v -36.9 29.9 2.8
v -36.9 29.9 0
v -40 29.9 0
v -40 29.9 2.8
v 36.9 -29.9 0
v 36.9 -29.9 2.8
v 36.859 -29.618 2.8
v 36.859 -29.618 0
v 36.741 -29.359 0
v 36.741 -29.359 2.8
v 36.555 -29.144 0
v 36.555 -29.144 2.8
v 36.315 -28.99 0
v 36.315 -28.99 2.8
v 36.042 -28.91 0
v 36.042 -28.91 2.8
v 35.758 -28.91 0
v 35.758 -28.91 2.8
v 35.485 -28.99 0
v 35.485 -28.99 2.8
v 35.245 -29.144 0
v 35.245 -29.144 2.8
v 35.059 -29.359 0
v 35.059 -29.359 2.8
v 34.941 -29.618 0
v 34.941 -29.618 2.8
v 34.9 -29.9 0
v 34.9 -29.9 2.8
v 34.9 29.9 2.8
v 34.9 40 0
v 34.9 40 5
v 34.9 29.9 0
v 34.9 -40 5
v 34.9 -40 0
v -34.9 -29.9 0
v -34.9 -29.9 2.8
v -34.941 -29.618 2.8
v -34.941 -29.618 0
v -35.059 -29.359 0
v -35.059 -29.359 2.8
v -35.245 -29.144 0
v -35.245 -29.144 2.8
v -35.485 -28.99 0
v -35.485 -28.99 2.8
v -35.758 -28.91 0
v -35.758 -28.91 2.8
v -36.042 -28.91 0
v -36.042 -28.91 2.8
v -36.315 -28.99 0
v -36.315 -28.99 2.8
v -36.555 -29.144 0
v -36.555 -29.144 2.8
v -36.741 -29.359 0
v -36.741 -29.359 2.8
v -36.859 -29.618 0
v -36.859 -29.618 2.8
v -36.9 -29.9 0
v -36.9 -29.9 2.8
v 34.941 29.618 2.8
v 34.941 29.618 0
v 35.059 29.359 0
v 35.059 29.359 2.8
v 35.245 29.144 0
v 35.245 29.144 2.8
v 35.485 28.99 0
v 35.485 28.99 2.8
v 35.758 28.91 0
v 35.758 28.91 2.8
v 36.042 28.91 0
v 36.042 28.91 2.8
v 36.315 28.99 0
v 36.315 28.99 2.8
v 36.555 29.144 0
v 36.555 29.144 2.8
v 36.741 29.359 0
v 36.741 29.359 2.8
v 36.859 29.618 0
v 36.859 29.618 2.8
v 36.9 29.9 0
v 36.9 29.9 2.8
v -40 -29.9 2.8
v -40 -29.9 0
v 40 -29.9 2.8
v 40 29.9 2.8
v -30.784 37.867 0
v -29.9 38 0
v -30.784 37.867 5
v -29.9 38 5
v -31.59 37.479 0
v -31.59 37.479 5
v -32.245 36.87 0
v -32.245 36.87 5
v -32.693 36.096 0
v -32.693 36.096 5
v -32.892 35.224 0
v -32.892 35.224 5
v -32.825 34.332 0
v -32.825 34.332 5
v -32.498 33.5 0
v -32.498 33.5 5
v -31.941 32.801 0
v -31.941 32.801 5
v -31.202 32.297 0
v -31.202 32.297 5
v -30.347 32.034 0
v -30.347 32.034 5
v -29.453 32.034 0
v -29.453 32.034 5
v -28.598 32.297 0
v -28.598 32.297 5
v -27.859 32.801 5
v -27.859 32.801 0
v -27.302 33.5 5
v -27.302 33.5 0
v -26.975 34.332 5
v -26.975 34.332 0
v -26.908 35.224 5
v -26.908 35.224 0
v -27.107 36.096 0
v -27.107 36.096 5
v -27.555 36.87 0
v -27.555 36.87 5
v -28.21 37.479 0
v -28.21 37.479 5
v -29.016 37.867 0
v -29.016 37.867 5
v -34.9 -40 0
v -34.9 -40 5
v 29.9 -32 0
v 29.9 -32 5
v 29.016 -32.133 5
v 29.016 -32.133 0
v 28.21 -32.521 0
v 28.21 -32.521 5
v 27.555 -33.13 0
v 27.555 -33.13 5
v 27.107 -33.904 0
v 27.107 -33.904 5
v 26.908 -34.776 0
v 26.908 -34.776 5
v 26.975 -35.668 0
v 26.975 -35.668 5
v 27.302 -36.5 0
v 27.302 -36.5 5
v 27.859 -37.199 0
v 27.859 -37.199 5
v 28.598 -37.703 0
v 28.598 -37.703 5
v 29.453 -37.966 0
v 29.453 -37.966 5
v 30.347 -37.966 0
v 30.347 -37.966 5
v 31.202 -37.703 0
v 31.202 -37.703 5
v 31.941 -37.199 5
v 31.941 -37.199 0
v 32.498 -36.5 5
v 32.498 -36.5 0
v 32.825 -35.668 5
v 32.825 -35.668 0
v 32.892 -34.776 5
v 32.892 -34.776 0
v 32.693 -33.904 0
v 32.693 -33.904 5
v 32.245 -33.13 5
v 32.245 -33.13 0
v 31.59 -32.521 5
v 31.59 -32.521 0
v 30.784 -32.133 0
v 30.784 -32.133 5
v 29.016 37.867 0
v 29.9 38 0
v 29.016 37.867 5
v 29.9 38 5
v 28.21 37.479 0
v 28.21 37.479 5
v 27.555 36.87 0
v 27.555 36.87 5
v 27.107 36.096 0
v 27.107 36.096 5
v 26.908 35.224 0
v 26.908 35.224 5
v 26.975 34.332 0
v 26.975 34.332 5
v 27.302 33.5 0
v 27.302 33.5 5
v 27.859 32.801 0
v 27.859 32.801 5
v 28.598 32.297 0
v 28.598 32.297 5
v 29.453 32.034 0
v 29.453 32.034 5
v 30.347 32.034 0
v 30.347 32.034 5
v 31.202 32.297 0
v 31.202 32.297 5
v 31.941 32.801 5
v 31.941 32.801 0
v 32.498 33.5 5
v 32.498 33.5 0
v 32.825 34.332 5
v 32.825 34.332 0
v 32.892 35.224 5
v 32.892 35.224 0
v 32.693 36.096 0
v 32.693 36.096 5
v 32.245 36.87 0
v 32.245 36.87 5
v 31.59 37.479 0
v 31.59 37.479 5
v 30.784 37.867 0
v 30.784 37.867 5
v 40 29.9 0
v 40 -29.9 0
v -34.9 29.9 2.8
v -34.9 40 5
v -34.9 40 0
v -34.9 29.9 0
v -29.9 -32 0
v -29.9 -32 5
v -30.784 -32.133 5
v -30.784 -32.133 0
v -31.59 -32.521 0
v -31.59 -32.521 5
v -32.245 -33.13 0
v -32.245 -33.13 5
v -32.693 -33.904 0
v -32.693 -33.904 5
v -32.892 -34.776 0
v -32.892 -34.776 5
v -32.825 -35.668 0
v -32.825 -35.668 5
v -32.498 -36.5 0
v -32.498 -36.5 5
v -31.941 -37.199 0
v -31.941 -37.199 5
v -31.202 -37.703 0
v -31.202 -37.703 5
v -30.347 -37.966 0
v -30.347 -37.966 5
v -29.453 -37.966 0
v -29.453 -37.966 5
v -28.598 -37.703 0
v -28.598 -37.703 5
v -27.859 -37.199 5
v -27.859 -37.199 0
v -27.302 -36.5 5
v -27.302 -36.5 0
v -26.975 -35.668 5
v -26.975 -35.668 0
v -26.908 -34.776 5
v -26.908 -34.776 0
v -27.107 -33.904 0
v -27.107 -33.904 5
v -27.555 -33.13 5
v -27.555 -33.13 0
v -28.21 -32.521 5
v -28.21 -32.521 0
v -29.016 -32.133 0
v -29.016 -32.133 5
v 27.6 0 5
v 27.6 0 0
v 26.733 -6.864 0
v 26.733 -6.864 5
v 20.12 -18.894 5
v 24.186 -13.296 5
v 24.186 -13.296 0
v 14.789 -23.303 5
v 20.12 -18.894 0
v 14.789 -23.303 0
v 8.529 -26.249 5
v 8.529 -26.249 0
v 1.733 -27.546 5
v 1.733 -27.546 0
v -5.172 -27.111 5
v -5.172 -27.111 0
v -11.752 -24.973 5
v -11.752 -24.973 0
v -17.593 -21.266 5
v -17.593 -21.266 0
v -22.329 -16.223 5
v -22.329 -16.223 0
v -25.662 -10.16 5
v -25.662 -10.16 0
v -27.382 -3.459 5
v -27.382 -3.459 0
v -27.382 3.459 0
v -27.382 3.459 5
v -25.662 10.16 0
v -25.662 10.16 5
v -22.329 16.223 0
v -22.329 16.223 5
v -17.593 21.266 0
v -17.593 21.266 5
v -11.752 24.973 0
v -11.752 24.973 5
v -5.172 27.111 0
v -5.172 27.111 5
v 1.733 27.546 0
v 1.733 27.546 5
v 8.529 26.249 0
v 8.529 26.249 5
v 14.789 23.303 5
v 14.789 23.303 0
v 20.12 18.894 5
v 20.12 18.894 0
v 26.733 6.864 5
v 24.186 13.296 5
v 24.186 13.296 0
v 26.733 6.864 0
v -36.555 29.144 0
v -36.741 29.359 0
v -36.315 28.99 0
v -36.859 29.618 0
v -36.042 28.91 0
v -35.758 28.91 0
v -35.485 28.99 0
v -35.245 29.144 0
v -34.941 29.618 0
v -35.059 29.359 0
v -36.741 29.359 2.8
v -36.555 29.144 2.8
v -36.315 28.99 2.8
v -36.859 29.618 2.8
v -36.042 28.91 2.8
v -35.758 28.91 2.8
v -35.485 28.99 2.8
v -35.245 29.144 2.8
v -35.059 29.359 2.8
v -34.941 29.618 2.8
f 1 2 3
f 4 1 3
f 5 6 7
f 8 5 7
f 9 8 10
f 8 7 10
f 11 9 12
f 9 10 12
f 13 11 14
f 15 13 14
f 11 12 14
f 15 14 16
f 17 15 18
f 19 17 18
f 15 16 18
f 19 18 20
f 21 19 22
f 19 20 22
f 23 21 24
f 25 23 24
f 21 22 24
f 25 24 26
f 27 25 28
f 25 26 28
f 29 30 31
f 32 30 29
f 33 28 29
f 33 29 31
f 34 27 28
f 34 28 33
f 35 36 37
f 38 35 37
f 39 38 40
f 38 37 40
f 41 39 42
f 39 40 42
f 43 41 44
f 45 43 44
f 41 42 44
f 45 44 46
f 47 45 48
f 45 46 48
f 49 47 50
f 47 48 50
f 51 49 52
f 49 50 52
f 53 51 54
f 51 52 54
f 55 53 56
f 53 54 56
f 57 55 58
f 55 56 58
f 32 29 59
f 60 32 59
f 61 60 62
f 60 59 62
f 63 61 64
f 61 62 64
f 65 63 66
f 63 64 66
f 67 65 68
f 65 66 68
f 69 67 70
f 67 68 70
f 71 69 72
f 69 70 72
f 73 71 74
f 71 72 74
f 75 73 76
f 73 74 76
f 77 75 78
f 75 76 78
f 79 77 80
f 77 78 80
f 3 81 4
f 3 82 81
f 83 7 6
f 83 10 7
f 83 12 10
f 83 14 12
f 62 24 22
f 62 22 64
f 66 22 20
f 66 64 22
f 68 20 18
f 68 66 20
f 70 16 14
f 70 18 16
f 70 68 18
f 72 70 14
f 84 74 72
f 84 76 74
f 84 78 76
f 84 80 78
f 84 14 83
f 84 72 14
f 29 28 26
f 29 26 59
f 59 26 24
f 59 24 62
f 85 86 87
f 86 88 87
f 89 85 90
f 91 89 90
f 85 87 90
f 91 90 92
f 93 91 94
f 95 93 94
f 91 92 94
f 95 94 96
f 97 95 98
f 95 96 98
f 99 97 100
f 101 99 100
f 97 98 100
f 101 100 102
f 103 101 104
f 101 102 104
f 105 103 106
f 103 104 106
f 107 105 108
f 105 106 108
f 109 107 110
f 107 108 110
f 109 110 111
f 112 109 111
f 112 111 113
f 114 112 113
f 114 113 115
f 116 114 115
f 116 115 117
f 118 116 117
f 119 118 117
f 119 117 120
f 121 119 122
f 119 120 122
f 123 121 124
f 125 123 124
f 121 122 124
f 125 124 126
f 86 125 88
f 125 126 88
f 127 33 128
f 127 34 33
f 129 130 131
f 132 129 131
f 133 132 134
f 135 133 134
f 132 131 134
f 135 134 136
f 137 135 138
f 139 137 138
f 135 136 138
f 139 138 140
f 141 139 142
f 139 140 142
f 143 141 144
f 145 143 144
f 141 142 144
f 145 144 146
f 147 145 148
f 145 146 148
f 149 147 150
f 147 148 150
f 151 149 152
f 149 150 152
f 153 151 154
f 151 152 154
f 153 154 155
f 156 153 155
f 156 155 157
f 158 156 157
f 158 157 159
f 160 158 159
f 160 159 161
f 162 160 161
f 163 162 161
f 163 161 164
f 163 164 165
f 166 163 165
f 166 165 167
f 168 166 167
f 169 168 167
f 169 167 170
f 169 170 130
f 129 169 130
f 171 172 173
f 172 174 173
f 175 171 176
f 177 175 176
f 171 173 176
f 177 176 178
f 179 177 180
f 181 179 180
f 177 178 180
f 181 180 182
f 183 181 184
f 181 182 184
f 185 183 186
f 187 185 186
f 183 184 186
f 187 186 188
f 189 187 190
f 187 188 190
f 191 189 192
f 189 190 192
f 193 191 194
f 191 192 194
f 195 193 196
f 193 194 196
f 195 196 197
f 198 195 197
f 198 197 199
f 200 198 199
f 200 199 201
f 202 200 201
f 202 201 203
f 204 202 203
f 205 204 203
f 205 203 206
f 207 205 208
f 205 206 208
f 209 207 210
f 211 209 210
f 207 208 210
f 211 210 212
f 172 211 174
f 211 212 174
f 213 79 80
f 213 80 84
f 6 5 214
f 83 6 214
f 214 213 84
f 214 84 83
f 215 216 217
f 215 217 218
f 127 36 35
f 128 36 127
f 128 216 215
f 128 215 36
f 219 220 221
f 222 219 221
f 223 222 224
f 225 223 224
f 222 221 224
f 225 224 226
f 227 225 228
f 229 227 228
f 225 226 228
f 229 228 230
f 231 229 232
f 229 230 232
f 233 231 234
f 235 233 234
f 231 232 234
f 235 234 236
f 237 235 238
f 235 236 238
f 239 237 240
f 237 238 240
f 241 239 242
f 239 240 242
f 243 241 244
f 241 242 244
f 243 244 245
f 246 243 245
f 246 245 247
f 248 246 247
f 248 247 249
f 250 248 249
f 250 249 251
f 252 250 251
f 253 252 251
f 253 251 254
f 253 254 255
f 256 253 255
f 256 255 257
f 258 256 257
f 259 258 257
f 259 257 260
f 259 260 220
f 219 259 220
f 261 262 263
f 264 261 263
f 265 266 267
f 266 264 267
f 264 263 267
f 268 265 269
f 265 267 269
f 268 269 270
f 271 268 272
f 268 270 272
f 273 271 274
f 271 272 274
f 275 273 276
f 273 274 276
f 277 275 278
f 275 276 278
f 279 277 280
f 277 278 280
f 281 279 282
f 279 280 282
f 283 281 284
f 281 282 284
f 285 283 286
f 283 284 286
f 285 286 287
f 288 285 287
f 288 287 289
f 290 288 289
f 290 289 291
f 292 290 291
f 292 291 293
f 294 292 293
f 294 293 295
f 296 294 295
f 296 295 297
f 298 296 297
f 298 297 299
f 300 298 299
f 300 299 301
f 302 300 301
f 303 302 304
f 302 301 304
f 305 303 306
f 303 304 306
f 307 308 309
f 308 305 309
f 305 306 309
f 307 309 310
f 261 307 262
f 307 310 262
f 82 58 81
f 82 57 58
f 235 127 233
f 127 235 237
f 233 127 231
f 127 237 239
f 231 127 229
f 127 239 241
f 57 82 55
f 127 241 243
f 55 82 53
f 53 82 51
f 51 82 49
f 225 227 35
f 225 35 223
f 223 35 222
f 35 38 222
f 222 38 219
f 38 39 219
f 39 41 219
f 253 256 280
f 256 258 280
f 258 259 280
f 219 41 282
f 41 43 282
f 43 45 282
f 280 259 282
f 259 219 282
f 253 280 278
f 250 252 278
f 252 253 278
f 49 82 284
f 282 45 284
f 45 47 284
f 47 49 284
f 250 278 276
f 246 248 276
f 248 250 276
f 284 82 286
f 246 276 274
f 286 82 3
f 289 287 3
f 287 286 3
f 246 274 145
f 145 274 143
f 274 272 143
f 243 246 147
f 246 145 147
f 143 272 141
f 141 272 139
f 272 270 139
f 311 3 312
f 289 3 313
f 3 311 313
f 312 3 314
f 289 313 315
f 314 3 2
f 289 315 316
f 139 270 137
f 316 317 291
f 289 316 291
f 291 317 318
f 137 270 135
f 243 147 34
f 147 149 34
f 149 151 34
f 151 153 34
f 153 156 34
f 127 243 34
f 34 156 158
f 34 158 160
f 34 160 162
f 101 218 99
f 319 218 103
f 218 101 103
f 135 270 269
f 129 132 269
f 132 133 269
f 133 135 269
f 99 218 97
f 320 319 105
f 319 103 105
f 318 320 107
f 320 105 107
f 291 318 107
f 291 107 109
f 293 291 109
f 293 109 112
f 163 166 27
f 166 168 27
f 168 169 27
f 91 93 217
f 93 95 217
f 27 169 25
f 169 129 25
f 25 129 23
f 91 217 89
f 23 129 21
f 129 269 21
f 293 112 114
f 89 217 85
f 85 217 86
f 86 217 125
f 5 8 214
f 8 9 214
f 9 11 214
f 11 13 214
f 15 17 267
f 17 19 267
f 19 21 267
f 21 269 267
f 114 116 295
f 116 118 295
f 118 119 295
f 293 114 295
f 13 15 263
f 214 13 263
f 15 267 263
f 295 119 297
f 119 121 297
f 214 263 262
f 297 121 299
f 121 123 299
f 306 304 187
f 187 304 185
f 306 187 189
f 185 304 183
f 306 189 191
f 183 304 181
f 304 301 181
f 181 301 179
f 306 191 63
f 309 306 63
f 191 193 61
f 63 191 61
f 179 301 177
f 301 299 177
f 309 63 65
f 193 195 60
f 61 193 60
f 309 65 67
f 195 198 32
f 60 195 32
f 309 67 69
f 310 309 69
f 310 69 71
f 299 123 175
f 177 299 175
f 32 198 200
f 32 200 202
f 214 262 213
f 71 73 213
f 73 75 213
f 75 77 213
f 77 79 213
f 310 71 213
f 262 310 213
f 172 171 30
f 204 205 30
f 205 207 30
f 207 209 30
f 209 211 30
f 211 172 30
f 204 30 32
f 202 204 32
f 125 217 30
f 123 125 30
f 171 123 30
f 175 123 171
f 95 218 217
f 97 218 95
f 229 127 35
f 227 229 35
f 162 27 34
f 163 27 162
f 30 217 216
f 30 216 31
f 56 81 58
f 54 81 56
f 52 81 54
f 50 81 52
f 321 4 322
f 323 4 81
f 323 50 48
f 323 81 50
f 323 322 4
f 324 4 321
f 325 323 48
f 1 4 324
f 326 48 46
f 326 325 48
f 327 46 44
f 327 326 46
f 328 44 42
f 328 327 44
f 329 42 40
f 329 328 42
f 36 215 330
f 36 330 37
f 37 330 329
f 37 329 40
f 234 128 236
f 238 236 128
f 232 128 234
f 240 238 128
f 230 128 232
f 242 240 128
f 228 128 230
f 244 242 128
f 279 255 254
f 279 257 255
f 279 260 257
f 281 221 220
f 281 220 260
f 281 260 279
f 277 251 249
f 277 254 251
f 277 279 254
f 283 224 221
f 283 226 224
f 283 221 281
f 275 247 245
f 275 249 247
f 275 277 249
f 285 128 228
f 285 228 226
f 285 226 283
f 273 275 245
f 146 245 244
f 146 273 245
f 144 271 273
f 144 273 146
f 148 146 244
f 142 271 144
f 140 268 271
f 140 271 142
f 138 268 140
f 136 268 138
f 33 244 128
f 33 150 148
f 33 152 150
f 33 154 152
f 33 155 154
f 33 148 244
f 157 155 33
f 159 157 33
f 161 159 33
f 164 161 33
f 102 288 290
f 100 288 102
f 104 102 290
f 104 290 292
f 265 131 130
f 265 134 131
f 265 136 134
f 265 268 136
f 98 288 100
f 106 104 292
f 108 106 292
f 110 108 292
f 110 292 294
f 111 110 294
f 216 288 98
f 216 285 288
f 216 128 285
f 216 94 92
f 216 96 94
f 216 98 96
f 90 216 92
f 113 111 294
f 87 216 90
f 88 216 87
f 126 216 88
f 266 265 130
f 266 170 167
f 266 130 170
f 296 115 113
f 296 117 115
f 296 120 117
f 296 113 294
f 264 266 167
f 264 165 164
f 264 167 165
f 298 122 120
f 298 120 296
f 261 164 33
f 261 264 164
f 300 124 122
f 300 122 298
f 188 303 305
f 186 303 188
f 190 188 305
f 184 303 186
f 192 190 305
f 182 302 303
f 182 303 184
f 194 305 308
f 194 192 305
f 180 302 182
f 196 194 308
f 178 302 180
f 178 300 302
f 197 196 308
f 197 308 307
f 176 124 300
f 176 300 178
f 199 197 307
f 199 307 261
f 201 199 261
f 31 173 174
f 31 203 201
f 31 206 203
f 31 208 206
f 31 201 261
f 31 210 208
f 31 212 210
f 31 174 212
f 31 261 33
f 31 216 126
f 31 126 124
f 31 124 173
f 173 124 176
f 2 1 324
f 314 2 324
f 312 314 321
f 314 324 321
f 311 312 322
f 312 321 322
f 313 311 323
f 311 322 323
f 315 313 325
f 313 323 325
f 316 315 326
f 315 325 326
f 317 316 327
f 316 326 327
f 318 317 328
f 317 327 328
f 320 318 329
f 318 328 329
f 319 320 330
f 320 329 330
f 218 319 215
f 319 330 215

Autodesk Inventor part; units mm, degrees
ref_plane "YZ Plane" through (0, 0, 0) normal (1, 0, 0) x (0, 1, 0)
ref_plane "XZ Plane" through (0, 0, 0) normal (0, 1, 0) x (-1, 0, 0)
ref_plane "XY Plane" through (0, 0, 0) normal (0, 0, 1) x (1, 0, 0)
sketch "スケッチ1" plane through (0, 0, 0) normal (0, 0, 1) x (1, 0, 0)
  circle A0 centre (0, 0) radius 27.6
  line L0 (-40, 40) -> (40, 40)
  line L1 (40, 40) -> (40, -40)
  line L2 (40, -40) -> (-40, -40)
  line L3 (-40, -40) -> (-40, 40)
  dimension "d0" = 55.2
  dimension "d1" = 40
  dimension "d2" = 80
  dimension "d3" = 80
  dimension "d4" = 40
extrude "押し出し1" add sketch "スケッチ1" along normal blind 5
sketch "スケッチ3" plane through (0, 0, 5) normal (0, 0, 1) x (1, 0, 0)
  line L0 (40, -40) -> (-40, -40) projected
  line L1 (-40, 40) -> (-34.9, 40)
  line L2 (-34.9, 40) -> (-34.9, -40)
  line L3 (-34.9, -40) -> (-40, -40)
  line L4 (-40, -40) -> (-40, 40)
  line L5 (40, 40) -> (34.9, 40)
  line L6 (34.9, 40) -> (34.9, -40)
  line L7 (34.9, -40) -> (40, -40)
  line L8 (40, -40) -> (40, 40)
  dimension "d17" = 5.1
  dimension "d18" = 5.1
extrude "押し出し3" cut sketch "スケッチ3" against normal blind 2.2
sketch "スケッチ4" plane through (0, 0, 0) normal (0, 0, -1) x (-1, 0, 0)
  line L0 (-40, 40) -> (-34.9, 40)
  line L1 (-34.9, 40) -> (-34.9, 29.9)
  line L2 (-34.9, 29.9) -> (-40, 29.9)
  line L3 (-40, 29.9) -> (-40, 40)
  line L4 (-40, -40) -> (-34.9, -40)
  line L5 (-34.9, -40) -> (-34.9, -29.9)
  line L6 (-34.9, -29.9) -> (-40, -29.9)
  line L7 (-40, -29.9) -> (-40, -40)
  line L8 (40, 40) -> (34.9, 40)
  line L9 (34.9, 40) -> (34.9, 29.9)
  line L10 (34.9, 29.9) -> (40, 29.9)
  line L11 (40, 29.9) -> (40, 40)
  line L12 (40, -40) -> (34.9, -40)
  line L13 (34.9, -40) -> (34.9, -29.9)
  line L14 (34.9, -29.9) -> (40, -29.9)
  line L15 (40, -29.9) -> (40, -40)
  dimension "d21" = 5.1
  dimension "d22" = 10.1
  dimension "d23" = 10.1
  dimension "d24" = 10.1
  dimension "d25" = 5.1
  dimension "d26" = 5.1
  dimension "d27" = 5.1
  dimension "d28" = 10.1
extrude "押し出し4" cut sketch "スケッチ4" against normal through all
sketch "スケッチ5" plane through (0, 0, 0) normal (0, 0, -1) x (-1, 0, 0)
  line L0 (-40, -29.9) -> (-34.9, -29.9) projected
  line L1 (-34.9, -29.9) -> (-34.9, -40) projected
  line L2 (34.9, -40) -> (34.9, -29.9) projected
  line L3 (34.9, -29.9) -> (40, -29.9) projected
  line L4 (40, 29.9) -> (34.9, 29.9) projected
  line L5 (34.9, 29.9) -> (34.9, 40) projected
  line L6 (-34.9, 40) -> (-34.9, 29.9) projected
  line L7 (-34.9, 29.9) -> (-40, 29.9) projected
  point P0 (-35.9, 29.9)
  point P1 (-35.9, -29.9)
  point P2 (35.9, -29.9)
  point P3 (35.9, 29.9)
  dimension "d31" = 1
  dimension "d32" = 1
  dimension "d33" = 1
  dimension "d34" = 1
hole "Hole1" at (35.9, 29.9, 0) at (35.9, -29.9, 0) at (-35.9, -29.9, 0) at (-35.9, 29.9, 0) direction (0, 0, 1) diameter 2 end through all
sketch "スケッチ6" plane through (0, 0, 0) normal (0, 0, -1) x (-1, 0, 0)
  line L0 (34.9, 29.9) -> (34.9, 40) projected
  line L1 (34.9, 40) -> (-34.9, 40) projected
  line L2 (-34.9, 40) -> (-34.9, 29.9) projected
  line L3 (-34.9, -29.9) -> (-34.9, -40) projected
  line L4 (-34.9, -40) -> (34.9, -40) projected
  line L5 (34.9, -40) -> (34.9, -29.9) projected
  point P0 (-29.9, 35)
  point P1 (-29.9, -35)
  point P2 (29.9, -35)
  point P3 (29.9, 35)
  dimension "d42" = 5
  dimension "d43" = 5
  dimension "d44" = 5
  dimension "d45" = 5
  dimension "d46" = 5
  dimension "d47" = 5
  dimension "d48" = 5
  dimension "d49" = 5
hole "Hole2" at (29.9, 35, 0) at (29.9, -35, 0) at (-29.9, -35, 0) at (-29.9, 35, 0) direction (0, 0, 1) diameter 6 end through all
equation "\"d1\" = 0.5 * d2"
equation "\"d3\" = d2"
equation "\"d4\" = d1"
equation "\"d18\" = d17"
equation "\"d23\" = d22"
equation "\"d25\" = d21"
equation "\"d26\" = d21"
equation "\"d27\" = d21"
equation "\"d28\" = d22"
equation "\"d32\" = d31"
equation "\"d33\" = d31"
equation "\"d34\" = d31"
equation "\"d43\" = d42"
equation "\"d44\" = d42"
equation "\"d45\" = d42"
equation "\"d46\" = d42"
equation "\"d47\" = d42"
equation "\"d48\" = d42"
equation "\"d49\" = d42"
properties part number "JointA2"
